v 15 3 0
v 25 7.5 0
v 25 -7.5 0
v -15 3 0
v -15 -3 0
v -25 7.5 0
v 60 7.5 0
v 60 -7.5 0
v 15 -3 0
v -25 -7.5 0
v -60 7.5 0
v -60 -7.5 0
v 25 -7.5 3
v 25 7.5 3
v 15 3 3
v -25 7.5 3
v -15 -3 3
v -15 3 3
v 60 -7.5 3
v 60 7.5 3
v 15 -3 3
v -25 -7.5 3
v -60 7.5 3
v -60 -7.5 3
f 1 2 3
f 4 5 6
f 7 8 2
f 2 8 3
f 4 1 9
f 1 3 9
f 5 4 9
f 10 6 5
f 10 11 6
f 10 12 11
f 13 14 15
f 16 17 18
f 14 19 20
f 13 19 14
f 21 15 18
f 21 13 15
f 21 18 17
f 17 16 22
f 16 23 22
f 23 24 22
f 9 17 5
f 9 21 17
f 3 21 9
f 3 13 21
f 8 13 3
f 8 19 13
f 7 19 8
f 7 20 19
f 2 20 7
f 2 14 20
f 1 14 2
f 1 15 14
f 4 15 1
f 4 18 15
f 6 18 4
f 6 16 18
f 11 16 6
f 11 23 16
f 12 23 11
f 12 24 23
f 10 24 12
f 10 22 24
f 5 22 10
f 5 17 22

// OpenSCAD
// Flat tensile test specimen (dog bone)
// Print orientation: flat on bed, symmetric about origin

// ---------- Dimensions ----------
thickness     = 3;    // specimen thickness (Z)
total_length  = 120;  // overall length (X)
gauge_width   = 6;    // gauge section width (Y)
gauge_length  = 30;   // gauge section length (X)
grip_width    = 15;   // grip section width (Y)
grip_length   = 35;   // grip section length (X), each end
trans_length  = 10;   // linear transition length (X), each side

// ---------- Derived ----------
x_gauge = gauge_length / 2;            // end of gauge (15)
x_trans = x_gauge + trans_length;      // end of transition (25)
x_end   = x_trans + grip_length;       // end of grip (60)
gw2     = gauge_width / 2;
pw2     = grip_width / 2;

// Sanity check
assert(abs(2 * x_end - total_length) < 0.001, "Section lengths do not sum to total length");

// ---------- Outline (top view) ----------
outline = [
    [ x_end,   -pw2], [ x_end,    pw2],
    [ x_trans,  pw2], [ x_gauge,  gw2],
    [-x_gauge,  gw2], [-x_trans,  pw2],
    [-x_end,    pw2], [-x_end,   -pw2],
    [-x_trans, -pw2], [-x_gauge, -gw2],
    [ x_gauge, -gw2], [ x_trans, -pw2]
];

// ---------- Part ----------
linear_extrude(height = thickness)
    polygon(points = outline);
